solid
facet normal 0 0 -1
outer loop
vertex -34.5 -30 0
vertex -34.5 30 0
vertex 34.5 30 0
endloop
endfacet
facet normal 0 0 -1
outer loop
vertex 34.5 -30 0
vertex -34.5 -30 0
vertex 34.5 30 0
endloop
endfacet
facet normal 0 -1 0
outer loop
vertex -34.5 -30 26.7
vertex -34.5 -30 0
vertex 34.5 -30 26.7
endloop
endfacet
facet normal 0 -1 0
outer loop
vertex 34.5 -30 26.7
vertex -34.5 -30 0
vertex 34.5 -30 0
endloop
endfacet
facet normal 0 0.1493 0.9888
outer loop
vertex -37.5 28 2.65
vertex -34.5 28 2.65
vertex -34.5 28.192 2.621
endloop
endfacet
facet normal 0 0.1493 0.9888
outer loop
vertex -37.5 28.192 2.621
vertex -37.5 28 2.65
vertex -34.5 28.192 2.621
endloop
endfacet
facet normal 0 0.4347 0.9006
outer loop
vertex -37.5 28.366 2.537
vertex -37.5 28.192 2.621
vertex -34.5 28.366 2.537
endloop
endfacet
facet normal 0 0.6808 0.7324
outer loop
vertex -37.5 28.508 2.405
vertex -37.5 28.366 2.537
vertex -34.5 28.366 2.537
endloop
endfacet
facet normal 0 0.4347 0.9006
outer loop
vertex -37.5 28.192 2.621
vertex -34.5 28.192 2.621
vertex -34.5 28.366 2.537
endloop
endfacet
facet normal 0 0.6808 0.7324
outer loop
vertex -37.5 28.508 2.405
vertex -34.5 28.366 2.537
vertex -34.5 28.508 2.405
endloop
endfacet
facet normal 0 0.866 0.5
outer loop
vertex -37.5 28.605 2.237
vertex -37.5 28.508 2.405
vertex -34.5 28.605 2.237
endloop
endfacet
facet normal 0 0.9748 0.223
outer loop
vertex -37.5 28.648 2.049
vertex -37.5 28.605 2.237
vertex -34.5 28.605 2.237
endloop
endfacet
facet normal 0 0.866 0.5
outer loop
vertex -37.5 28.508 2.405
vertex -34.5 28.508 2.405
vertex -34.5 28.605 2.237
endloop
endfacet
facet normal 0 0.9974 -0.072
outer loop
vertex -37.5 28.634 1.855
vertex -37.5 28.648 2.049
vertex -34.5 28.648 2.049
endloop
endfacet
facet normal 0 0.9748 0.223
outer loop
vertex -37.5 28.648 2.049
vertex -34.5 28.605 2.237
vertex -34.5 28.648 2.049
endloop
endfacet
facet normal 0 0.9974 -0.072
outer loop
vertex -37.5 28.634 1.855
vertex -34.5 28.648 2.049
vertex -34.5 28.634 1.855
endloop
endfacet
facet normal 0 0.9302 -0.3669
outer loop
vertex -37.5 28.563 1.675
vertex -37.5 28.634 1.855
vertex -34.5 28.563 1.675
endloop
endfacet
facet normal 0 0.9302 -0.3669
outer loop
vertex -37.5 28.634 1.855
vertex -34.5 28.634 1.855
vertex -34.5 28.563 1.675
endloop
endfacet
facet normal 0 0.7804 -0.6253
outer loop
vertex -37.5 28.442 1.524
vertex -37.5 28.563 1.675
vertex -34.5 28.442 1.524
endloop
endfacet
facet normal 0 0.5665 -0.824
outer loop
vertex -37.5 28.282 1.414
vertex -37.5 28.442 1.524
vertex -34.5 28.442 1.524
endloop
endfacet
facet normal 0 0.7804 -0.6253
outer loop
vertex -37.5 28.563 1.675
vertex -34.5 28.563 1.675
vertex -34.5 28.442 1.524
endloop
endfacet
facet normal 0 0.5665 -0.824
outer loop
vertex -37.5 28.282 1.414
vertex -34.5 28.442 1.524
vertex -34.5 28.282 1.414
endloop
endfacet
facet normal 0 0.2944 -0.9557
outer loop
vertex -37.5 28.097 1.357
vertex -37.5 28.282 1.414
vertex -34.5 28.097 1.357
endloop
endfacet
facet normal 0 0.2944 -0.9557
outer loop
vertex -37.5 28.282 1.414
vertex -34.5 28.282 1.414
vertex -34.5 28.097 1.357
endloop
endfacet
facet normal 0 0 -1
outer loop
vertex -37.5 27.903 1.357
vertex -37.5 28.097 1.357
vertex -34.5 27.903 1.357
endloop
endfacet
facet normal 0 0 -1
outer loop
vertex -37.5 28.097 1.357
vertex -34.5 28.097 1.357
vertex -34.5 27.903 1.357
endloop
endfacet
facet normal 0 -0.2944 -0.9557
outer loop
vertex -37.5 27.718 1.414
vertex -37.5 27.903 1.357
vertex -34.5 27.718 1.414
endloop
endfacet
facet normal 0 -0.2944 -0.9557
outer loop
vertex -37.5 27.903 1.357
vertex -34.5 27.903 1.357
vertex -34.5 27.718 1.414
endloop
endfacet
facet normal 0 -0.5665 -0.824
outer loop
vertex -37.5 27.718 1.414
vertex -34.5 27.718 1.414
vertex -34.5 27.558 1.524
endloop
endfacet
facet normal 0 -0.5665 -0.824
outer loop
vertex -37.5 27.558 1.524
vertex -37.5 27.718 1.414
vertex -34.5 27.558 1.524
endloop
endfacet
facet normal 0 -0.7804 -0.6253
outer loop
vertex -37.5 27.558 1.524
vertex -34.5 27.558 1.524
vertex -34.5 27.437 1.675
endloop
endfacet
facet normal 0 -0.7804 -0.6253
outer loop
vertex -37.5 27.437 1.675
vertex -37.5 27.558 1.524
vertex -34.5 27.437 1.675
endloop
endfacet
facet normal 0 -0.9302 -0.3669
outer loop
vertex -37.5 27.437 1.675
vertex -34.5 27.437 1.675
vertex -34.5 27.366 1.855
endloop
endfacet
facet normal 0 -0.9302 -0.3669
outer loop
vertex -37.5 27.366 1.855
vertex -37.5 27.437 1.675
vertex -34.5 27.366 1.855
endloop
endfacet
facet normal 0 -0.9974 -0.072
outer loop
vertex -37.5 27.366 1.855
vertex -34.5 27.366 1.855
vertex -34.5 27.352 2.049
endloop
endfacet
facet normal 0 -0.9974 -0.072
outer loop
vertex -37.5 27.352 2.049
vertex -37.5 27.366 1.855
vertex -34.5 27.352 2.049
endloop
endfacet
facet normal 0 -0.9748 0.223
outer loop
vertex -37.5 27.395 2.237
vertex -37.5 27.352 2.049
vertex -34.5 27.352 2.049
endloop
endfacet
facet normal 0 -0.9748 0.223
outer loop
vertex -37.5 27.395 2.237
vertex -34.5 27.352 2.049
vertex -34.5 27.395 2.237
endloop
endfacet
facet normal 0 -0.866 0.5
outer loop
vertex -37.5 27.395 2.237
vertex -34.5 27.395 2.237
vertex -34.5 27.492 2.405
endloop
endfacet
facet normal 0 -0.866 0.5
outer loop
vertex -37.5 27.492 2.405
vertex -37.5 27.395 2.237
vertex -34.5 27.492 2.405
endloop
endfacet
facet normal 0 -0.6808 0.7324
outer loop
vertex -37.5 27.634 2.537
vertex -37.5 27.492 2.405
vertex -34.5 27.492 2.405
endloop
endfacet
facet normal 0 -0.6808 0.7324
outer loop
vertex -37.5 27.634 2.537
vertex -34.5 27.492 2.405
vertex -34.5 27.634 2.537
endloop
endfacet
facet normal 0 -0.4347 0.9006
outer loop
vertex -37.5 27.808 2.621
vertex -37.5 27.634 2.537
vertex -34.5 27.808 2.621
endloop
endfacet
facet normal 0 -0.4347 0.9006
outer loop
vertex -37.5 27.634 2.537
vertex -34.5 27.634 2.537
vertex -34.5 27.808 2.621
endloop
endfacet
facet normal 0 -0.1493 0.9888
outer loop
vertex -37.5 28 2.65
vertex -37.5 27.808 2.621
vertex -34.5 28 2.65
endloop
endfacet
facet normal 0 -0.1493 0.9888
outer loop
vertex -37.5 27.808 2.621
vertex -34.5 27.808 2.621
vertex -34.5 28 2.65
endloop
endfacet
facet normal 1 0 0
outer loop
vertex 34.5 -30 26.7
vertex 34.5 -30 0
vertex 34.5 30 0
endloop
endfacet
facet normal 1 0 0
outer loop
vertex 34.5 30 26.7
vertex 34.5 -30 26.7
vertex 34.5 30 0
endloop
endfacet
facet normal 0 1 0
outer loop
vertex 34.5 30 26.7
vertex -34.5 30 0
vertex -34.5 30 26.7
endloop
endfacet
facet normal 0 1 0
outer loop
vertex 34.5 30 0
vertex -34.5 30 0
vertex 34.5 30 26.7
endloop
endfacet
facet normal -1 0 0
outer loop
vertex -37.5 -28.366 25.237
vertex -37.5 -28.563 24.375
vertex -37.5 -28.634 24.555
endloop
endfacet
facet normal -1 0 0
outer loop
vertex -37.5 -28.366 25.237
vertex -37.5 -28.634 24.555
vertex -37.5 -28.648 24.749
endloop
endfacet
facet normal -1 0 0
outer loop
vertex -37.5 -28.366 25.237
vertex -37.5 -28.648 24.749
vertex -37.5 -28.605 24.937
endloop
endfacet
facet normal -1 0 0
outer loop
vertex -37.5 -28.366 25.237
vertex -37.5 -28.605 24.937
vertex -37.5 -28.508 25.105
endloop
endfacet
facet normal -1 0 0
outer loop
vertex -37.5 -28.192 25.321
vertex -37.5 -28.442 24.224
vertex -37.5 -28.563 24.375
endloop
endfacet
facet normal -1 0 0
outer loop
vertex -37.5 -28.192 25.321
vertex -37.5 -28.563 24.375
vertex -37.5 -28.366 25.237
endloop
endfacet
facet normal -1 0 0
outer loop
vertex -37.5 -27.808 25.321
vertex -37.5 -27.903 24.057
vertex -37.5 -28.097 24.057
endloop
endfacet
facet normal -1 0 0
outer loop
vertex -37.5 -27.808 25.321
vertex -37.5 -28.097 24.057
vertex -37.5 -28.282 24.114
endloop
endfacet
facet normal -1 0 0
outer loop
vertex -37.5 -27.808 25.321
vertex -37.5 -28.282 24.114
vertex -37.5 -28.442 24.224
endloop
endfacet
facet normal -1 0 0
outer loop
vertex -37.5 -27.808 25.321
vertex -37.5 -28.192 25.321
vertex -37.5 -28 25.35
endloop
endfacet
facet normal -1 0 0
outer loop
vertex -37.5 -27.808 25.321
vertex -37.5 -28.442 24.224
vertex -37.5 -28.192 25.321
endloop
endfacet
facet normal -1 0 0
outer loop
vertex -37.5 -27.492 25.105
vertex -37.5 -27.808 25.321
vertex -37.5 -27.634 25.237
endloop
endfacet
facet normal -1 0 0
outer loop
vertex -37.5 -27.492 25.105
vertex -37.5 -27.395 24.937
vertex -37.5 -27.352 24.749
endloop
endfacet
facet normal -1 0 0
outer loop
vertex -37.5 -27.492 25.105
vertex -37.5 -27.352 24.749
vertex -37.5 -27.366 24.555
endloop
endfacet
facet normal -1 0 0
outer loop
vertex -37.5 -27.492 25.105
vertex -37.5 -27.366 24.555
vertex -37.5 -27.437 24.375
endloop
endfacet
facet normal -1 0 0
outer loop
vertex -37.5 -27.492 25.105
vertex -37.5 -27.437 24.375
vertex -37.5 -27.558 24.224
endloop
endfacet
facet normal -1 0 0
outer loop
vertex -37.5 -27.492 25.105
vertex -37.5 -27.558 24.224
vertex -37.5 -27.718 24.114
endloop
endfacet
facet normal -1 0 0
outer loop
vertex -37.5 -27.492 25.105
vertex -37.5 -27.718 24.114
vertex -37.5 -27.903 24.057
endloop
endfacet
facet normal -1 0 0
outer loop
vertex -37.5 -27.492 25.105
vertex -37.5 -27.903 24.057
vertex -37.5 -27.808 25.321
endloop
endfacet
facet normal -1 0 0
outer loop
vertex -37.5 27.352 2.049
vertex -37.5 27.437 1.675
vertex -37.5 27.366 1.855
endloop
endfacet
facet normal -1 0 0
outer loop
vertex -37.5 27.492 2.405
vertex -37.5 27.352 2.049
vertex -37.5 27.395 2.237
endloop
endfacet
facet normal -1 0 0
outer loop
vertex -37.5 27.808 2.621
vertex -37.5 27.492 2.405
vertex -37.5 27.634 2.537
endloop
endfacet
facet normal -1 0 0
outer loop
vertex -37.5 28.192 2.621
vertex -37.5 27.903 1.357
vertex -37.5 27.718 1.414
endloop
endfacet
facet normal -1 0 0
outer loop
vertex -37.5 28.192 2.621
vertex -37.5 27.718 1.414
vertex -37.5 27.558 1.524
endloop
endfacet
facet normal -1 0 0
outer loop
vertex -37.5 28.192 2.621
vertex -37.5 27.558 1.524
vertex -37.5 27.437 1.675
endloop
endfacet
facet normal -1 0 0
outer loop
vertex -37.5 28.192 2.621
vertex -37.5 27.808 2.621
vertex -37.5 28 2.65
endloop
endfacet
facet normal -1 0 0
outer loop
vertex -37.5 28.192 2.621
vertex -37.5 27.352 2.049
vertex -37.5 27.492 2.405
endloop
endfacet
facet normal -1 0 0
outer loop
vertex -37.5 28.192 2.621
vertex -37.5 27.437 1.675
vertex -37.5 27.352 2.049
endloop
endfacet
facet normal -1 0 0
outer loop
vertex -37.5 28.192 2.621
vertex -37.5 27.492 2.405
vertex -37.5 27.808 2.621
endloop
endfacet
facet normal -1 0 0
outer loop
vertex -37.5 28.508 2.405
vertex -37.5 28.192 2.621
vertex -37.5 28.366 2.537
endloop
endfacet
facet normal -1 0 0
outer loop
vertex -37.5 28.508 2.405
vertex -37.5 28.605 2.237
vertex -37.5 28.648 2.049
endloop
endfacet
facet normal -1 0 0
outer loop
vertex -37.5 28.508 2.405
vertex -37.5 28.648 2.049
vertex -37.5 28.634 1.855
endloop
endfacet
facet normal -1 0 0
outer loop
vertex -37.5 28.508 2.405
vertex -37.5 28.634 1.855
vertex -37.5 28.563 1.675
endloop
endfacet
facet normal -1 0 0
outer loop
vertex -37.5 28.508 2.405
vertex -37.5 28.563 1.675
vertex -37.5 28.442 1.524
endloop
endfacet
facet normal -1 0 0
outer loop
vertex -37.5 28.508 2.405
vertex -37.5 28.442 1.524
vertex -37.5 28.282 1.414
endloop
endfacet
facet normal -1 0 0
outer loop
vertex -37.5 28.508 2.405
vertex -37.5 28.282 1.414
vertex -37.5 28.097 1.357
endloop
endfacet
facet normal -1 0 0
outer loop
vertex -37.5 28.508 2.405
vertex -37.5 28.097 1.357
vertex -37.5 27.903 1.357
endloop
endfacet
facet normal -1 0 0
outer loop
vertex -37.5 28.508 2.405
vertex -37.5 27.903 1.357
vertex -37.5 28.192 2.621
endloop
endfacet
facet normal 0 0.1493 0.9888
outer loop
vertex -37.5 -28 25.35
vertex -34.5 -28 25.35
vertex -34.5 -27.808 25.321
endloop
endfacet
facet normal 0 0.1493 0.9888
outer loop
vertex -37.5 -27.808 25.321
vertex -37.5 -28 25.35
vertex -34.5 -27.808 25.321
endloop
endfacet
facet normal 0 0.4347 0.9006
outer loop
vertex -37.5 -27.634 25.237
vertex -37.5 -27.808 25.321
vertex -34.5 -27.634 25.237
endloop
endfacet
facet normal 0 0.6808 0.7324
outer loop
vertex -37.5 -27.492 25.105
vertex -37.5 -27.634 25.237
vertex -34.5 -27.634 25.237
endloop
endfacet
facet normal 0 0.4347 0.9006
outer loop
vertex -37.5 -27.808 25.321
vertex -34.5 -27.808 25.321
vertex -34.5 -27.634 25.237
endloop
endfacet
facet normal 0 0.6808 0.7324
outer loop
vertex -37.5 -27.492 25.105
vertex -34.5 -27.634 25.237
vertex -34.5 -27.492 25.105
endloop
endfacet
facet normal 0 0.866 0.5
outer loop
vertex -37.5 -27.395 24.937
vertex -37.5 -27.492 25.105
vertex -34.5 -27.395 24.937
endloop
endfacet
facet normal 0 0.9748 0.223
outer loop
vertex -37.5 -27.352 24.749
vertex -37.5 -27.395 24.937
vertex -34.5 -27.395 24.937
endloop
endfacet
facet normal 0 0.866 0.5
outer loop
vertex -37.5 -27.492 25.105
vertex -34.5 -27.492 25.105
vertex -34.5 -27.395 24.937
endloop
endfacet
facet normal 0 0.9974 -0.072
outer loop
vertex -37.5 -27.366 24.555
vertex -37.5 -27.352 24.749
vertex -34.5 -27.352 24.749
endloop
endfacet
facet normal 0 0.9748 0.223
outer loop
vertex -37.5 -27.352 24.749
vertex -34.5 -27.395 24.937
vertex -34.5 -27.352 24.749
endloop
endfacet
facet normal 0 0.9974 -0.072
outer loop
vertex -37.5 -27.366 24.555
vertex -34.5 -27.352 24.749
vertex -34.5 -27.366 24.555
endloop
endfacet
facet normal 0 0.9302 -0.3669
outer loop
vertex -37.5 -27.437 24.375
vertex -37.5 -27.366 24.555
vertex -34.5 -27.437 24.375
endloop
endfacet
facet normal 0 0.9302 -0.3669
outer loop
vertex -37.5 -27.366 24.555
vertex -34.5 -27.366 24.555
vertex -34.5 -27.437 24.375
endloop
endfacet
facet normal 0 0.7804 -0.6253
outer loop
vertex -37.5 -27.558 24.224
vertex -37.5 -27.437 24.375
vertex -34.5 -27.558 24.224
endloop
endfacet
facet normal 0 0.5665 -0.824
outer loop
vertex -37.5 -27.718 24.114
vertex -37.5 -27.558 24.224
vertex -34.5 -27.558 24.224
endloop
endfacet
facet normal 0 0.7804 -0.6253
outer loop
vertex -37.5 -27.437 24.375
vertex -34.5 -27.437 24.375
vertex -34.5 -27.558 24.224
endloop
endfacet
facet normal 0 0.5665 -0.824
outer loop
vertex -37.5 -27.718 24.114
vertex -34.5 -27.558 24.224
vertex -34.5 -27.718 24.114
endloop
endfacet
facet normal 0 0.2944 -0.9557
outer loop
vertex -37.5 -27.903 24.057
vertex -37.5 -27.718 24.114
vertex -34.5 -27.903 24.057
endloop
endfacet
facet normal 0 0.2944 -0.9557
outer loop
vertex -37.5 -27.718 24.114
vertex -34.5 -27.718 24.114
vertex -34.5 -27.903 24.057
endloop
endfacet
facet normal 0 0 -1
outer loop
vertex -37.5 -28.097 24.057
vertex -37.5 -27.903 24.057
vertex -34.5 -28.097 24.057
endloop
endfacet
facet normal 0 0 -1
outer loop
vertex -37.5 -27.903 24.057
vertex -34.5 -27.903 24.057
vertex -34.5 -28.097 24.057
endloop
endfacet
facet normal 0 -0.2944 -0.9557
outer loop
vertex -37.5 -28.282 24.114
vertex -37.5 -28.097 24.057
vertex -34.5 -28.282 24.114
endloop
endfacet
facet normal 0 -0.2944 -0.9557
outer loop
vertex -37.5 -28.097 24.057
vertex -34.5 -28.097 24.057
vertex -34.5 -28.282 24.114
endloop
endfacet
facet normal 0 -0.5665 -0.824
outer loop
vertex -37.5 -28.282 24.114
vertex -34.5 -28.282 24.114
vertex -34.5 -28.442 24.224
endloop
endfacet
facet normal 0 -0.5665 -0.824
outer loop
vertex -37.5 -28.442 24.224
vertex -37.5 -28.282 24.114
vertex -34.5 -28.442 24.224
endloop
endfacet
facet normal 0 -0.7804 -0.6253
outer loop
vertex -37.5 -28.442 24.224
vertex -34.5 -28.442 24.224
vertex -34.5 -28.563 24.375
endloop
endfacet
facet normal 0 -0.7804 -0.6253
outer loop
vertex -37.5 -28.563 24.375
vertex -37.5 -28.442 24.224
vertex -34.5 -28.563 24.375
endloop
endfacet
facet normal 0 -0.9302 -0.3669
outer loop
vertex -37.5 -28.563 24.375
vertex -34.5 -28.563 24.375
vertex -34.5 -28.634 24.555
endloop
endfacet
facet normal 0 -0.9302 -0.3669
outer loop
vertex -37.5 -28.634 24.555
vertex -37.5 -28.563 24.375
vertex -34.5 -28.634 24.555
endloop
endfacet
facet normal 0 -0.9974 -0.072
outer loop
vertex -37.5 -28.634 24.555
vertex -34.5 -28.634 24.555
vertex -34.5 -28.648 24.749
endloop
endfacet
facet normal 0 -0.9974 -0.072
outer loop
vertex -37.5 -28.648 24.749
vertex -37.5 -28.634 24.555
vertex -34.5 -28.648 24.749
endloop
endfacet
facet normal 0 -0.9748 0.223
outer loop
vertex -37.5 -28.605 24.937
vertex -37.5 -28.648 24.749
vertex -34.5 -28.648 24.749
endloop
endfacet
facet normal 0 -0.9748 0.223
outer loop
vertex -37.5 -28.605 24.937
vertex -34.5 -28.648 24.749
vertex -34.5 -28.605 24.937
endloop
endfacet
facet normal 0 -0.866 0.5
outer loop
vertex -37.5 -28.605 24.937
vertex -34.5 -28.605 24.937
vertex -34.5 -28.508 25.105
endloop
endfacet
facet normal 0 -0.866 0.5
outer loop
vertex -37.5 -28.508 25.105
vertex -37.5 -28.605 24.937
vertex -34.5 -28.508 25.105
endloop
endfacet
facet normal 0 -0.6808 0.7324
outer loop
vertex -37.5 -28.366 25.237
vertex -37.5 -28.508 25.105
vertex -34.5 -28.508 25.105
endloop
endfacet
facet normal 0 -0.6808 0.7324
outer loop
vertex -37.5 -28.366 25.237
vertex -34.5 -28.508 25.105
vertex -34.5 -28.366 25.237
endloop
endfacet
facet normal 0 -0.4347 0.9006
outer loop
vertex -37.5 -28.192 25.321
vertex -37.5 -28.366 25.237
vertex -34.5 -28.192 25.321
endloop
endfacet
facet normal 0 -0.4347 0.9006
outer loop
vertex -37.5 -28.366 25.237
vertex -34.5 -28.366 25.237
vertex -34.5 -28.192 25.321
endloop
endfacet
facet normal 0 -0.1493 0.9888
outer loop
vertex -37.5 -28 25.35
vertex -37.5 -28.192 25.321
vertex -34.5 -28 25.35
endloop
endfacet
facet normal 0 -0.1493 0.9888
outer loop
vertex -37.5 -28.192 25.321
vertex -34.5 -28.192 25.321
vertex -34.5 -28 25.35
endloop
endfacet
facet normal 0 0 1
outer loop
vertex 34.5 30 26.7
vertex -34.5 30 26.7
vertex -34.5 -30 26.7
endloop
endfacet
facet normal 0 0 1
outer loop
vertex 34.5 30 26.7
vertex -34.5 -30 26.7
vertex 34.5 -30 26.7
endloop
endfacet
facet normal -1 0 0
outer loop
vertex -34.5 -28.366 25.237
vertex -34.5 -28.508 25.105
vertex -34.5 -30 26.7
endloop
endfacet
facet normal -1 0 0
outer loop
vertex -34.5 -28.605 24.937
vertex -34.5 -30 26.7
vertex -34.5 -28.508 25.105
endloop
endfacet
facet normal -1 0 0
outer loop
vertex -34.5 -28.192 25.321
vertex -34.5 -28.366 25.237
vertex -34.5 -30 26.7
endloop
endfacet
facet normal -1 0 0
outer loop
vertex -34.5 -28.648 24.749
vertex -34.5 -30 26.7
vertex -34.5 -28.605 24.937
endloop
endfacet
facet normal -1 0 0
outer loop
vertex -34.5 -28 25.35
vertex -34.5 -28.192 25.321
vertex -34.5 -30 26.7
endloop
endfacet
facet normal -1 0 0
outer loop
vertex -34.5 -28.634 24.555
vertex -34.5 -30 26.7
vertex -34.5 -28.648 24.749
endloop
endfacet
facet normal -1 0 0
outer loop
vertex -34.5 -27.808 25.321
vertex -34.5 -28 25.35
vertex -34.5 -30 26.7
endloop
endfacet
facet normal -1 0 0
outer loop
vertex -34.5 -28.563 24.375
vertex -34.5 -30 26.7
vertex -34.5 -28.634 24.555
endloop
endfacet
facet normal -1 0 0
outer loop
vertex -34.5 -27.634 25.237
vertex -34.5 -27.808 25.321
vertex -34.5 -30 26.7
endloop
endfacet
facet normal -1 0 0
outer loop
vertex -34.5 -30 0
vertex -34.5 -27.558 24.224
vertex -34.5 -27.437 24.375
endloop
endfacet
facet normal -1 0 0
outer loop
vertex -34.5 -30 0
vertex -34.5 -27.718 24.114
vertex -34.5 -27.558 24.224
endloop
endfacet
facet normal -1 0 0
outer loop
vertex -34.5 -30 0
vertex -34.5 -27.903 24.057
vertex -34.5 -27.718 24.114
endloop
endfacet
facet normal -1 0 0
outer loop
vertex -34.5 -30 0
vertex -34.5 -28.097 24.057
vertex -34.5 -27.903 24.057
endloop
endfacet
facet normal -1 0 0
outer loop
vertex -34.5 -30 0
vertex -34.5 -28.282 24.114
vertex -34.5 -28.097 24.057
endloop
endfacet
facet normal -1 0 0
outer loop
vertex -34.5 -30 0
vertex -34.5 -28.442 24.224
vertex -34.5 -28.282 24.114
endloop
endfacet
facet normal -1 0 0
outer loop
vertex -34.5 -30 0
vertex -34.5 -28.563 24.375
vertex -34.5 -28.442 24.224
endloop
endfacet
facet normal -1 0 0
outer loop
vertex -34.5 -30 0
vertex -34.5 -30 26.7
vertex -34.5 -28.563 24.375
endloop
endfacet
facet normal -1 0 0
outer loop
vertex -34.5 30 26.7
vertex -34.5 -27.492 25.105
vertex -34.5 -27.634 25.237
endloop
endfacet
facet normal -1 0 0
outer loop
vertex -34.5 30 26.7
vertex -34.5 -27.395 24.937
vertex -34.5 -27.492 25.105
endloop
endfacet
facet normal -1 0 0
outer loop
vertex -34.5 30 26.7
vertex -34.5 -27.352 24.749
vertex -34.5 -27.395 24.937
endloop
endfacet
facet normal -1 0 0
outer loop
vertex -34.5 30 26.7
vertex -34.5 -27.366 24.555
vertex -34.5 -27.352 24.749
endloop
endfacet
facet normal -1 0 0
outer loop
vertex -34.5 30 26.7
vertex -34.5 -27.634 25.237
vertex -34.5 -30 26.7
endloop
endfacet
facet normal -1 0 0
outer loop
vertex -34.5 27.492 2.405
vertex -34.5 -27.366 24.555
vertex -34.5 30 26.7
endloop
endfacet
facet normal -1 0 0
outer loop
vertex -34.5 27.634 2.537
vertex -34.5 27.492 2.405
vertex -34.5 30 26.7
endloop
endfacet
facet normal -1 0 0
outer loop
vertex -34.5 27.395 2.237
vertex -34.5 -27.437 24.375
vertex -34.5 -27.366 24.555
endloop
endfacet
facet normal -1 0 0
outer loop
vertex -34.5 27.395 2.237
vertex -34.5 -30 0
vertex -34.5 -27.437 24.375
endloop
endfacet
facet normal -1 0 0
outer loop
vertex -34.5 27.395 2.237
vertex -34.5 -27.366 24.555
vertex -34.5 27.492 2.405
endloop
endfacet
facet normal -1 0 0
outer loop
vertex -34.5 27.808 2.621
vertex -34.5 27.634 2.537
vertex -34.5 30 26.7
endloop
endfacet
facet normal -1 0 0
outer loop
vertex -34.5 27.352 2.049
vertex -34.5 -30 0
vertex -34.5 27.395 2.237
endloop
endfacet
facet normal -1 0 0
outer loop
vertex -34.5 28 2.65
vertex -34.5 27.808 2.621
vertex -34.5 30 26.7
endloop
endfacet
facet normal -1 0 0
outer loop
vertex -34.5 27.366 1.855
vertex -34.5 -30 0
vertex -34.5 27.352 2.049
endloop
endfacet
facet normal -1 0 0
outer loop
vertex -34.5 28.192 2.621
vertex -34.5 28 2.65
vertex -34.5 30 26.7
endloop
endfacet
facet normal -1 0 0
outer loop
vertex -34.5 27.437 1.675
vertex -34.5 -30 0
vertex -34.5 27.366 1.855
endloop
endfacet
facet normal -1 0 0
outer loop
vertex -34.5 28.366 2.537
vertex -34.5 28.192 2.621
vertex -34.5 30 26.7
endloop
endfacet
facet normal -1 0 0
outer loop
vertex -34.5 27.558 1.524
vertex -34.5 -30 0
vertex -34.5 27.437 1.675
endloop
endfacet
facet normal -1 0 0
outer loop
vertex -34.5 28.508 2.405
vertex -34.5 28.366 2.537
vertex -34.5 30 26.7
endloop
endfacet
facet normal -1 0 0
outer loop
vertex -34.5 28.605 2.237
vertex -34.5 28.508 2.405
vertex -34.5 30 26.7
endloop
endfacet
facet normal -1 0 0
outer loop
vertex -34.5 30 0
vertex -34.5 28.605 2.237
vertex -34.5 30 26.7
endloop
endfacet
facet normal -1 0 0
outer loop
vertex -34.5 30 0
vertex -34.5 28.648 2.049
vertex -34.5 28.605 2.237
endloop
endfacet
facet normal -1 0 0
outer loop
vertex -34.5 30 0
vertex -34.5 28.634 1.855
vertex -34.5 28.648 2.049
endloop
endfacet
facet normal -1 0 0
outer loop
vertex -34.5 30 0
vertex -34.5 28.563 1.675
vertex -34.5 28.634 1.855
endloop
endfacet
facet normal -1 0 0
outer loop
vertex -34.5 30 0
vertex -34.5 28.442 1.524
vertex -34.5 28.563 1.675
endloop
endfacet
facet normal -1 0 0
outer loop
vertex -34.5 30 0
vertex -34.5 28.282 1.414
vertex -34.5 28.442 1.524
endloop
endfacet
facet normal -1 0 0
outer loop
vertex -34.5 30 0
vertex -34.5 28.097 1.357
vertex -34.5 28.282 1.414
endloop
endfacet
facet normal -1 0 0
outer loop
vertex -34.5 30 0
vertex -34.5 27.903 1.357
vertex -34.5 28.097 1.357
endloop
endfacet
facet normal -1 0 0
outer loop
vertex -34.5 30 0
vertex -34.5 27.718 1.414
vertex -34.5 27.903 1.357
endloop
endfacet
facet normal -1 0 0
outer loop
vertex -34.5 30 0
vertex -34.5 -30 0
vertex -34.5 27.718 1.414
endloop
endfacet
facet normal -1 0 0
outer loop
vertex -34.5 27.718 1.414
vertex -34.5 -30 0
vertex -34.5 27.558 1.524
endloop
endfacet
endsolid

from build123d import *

# Parameters (mm, degrees)
CROQUIS1_W              = 69
CROQUIS1_H              = 60
SALIENTE_EXTRUIR1_DEPTH = 26.7
CROQUIS2_R              = 0.65
SALIENTE_EXTRUIR2_DEPTH = 3


with BuildPart() as part:
    # Croquis1 → Saliente-Extruir1 (new body)
    with BuildSketch(Plane.XY):
        Rectangle(CROQUIS1_W, CROQUIS1_H)
    extrude(amount=SALIENTE_EXTRUIR1_DEPTH)

    # Croquis2 → Saliente-Extruir2 (add)
    with BuildSketch(Plane.ZY.offset(34.5)):
        with Locations((24.7, -28)):
            Circle(CROQUIS2_R)
        with Locations((2, 28)):
            Circle(CROQUIS2_R)
    extrude(amount=SALIENTE_EXTRUIR2_DEPTH)


solid = part.part
